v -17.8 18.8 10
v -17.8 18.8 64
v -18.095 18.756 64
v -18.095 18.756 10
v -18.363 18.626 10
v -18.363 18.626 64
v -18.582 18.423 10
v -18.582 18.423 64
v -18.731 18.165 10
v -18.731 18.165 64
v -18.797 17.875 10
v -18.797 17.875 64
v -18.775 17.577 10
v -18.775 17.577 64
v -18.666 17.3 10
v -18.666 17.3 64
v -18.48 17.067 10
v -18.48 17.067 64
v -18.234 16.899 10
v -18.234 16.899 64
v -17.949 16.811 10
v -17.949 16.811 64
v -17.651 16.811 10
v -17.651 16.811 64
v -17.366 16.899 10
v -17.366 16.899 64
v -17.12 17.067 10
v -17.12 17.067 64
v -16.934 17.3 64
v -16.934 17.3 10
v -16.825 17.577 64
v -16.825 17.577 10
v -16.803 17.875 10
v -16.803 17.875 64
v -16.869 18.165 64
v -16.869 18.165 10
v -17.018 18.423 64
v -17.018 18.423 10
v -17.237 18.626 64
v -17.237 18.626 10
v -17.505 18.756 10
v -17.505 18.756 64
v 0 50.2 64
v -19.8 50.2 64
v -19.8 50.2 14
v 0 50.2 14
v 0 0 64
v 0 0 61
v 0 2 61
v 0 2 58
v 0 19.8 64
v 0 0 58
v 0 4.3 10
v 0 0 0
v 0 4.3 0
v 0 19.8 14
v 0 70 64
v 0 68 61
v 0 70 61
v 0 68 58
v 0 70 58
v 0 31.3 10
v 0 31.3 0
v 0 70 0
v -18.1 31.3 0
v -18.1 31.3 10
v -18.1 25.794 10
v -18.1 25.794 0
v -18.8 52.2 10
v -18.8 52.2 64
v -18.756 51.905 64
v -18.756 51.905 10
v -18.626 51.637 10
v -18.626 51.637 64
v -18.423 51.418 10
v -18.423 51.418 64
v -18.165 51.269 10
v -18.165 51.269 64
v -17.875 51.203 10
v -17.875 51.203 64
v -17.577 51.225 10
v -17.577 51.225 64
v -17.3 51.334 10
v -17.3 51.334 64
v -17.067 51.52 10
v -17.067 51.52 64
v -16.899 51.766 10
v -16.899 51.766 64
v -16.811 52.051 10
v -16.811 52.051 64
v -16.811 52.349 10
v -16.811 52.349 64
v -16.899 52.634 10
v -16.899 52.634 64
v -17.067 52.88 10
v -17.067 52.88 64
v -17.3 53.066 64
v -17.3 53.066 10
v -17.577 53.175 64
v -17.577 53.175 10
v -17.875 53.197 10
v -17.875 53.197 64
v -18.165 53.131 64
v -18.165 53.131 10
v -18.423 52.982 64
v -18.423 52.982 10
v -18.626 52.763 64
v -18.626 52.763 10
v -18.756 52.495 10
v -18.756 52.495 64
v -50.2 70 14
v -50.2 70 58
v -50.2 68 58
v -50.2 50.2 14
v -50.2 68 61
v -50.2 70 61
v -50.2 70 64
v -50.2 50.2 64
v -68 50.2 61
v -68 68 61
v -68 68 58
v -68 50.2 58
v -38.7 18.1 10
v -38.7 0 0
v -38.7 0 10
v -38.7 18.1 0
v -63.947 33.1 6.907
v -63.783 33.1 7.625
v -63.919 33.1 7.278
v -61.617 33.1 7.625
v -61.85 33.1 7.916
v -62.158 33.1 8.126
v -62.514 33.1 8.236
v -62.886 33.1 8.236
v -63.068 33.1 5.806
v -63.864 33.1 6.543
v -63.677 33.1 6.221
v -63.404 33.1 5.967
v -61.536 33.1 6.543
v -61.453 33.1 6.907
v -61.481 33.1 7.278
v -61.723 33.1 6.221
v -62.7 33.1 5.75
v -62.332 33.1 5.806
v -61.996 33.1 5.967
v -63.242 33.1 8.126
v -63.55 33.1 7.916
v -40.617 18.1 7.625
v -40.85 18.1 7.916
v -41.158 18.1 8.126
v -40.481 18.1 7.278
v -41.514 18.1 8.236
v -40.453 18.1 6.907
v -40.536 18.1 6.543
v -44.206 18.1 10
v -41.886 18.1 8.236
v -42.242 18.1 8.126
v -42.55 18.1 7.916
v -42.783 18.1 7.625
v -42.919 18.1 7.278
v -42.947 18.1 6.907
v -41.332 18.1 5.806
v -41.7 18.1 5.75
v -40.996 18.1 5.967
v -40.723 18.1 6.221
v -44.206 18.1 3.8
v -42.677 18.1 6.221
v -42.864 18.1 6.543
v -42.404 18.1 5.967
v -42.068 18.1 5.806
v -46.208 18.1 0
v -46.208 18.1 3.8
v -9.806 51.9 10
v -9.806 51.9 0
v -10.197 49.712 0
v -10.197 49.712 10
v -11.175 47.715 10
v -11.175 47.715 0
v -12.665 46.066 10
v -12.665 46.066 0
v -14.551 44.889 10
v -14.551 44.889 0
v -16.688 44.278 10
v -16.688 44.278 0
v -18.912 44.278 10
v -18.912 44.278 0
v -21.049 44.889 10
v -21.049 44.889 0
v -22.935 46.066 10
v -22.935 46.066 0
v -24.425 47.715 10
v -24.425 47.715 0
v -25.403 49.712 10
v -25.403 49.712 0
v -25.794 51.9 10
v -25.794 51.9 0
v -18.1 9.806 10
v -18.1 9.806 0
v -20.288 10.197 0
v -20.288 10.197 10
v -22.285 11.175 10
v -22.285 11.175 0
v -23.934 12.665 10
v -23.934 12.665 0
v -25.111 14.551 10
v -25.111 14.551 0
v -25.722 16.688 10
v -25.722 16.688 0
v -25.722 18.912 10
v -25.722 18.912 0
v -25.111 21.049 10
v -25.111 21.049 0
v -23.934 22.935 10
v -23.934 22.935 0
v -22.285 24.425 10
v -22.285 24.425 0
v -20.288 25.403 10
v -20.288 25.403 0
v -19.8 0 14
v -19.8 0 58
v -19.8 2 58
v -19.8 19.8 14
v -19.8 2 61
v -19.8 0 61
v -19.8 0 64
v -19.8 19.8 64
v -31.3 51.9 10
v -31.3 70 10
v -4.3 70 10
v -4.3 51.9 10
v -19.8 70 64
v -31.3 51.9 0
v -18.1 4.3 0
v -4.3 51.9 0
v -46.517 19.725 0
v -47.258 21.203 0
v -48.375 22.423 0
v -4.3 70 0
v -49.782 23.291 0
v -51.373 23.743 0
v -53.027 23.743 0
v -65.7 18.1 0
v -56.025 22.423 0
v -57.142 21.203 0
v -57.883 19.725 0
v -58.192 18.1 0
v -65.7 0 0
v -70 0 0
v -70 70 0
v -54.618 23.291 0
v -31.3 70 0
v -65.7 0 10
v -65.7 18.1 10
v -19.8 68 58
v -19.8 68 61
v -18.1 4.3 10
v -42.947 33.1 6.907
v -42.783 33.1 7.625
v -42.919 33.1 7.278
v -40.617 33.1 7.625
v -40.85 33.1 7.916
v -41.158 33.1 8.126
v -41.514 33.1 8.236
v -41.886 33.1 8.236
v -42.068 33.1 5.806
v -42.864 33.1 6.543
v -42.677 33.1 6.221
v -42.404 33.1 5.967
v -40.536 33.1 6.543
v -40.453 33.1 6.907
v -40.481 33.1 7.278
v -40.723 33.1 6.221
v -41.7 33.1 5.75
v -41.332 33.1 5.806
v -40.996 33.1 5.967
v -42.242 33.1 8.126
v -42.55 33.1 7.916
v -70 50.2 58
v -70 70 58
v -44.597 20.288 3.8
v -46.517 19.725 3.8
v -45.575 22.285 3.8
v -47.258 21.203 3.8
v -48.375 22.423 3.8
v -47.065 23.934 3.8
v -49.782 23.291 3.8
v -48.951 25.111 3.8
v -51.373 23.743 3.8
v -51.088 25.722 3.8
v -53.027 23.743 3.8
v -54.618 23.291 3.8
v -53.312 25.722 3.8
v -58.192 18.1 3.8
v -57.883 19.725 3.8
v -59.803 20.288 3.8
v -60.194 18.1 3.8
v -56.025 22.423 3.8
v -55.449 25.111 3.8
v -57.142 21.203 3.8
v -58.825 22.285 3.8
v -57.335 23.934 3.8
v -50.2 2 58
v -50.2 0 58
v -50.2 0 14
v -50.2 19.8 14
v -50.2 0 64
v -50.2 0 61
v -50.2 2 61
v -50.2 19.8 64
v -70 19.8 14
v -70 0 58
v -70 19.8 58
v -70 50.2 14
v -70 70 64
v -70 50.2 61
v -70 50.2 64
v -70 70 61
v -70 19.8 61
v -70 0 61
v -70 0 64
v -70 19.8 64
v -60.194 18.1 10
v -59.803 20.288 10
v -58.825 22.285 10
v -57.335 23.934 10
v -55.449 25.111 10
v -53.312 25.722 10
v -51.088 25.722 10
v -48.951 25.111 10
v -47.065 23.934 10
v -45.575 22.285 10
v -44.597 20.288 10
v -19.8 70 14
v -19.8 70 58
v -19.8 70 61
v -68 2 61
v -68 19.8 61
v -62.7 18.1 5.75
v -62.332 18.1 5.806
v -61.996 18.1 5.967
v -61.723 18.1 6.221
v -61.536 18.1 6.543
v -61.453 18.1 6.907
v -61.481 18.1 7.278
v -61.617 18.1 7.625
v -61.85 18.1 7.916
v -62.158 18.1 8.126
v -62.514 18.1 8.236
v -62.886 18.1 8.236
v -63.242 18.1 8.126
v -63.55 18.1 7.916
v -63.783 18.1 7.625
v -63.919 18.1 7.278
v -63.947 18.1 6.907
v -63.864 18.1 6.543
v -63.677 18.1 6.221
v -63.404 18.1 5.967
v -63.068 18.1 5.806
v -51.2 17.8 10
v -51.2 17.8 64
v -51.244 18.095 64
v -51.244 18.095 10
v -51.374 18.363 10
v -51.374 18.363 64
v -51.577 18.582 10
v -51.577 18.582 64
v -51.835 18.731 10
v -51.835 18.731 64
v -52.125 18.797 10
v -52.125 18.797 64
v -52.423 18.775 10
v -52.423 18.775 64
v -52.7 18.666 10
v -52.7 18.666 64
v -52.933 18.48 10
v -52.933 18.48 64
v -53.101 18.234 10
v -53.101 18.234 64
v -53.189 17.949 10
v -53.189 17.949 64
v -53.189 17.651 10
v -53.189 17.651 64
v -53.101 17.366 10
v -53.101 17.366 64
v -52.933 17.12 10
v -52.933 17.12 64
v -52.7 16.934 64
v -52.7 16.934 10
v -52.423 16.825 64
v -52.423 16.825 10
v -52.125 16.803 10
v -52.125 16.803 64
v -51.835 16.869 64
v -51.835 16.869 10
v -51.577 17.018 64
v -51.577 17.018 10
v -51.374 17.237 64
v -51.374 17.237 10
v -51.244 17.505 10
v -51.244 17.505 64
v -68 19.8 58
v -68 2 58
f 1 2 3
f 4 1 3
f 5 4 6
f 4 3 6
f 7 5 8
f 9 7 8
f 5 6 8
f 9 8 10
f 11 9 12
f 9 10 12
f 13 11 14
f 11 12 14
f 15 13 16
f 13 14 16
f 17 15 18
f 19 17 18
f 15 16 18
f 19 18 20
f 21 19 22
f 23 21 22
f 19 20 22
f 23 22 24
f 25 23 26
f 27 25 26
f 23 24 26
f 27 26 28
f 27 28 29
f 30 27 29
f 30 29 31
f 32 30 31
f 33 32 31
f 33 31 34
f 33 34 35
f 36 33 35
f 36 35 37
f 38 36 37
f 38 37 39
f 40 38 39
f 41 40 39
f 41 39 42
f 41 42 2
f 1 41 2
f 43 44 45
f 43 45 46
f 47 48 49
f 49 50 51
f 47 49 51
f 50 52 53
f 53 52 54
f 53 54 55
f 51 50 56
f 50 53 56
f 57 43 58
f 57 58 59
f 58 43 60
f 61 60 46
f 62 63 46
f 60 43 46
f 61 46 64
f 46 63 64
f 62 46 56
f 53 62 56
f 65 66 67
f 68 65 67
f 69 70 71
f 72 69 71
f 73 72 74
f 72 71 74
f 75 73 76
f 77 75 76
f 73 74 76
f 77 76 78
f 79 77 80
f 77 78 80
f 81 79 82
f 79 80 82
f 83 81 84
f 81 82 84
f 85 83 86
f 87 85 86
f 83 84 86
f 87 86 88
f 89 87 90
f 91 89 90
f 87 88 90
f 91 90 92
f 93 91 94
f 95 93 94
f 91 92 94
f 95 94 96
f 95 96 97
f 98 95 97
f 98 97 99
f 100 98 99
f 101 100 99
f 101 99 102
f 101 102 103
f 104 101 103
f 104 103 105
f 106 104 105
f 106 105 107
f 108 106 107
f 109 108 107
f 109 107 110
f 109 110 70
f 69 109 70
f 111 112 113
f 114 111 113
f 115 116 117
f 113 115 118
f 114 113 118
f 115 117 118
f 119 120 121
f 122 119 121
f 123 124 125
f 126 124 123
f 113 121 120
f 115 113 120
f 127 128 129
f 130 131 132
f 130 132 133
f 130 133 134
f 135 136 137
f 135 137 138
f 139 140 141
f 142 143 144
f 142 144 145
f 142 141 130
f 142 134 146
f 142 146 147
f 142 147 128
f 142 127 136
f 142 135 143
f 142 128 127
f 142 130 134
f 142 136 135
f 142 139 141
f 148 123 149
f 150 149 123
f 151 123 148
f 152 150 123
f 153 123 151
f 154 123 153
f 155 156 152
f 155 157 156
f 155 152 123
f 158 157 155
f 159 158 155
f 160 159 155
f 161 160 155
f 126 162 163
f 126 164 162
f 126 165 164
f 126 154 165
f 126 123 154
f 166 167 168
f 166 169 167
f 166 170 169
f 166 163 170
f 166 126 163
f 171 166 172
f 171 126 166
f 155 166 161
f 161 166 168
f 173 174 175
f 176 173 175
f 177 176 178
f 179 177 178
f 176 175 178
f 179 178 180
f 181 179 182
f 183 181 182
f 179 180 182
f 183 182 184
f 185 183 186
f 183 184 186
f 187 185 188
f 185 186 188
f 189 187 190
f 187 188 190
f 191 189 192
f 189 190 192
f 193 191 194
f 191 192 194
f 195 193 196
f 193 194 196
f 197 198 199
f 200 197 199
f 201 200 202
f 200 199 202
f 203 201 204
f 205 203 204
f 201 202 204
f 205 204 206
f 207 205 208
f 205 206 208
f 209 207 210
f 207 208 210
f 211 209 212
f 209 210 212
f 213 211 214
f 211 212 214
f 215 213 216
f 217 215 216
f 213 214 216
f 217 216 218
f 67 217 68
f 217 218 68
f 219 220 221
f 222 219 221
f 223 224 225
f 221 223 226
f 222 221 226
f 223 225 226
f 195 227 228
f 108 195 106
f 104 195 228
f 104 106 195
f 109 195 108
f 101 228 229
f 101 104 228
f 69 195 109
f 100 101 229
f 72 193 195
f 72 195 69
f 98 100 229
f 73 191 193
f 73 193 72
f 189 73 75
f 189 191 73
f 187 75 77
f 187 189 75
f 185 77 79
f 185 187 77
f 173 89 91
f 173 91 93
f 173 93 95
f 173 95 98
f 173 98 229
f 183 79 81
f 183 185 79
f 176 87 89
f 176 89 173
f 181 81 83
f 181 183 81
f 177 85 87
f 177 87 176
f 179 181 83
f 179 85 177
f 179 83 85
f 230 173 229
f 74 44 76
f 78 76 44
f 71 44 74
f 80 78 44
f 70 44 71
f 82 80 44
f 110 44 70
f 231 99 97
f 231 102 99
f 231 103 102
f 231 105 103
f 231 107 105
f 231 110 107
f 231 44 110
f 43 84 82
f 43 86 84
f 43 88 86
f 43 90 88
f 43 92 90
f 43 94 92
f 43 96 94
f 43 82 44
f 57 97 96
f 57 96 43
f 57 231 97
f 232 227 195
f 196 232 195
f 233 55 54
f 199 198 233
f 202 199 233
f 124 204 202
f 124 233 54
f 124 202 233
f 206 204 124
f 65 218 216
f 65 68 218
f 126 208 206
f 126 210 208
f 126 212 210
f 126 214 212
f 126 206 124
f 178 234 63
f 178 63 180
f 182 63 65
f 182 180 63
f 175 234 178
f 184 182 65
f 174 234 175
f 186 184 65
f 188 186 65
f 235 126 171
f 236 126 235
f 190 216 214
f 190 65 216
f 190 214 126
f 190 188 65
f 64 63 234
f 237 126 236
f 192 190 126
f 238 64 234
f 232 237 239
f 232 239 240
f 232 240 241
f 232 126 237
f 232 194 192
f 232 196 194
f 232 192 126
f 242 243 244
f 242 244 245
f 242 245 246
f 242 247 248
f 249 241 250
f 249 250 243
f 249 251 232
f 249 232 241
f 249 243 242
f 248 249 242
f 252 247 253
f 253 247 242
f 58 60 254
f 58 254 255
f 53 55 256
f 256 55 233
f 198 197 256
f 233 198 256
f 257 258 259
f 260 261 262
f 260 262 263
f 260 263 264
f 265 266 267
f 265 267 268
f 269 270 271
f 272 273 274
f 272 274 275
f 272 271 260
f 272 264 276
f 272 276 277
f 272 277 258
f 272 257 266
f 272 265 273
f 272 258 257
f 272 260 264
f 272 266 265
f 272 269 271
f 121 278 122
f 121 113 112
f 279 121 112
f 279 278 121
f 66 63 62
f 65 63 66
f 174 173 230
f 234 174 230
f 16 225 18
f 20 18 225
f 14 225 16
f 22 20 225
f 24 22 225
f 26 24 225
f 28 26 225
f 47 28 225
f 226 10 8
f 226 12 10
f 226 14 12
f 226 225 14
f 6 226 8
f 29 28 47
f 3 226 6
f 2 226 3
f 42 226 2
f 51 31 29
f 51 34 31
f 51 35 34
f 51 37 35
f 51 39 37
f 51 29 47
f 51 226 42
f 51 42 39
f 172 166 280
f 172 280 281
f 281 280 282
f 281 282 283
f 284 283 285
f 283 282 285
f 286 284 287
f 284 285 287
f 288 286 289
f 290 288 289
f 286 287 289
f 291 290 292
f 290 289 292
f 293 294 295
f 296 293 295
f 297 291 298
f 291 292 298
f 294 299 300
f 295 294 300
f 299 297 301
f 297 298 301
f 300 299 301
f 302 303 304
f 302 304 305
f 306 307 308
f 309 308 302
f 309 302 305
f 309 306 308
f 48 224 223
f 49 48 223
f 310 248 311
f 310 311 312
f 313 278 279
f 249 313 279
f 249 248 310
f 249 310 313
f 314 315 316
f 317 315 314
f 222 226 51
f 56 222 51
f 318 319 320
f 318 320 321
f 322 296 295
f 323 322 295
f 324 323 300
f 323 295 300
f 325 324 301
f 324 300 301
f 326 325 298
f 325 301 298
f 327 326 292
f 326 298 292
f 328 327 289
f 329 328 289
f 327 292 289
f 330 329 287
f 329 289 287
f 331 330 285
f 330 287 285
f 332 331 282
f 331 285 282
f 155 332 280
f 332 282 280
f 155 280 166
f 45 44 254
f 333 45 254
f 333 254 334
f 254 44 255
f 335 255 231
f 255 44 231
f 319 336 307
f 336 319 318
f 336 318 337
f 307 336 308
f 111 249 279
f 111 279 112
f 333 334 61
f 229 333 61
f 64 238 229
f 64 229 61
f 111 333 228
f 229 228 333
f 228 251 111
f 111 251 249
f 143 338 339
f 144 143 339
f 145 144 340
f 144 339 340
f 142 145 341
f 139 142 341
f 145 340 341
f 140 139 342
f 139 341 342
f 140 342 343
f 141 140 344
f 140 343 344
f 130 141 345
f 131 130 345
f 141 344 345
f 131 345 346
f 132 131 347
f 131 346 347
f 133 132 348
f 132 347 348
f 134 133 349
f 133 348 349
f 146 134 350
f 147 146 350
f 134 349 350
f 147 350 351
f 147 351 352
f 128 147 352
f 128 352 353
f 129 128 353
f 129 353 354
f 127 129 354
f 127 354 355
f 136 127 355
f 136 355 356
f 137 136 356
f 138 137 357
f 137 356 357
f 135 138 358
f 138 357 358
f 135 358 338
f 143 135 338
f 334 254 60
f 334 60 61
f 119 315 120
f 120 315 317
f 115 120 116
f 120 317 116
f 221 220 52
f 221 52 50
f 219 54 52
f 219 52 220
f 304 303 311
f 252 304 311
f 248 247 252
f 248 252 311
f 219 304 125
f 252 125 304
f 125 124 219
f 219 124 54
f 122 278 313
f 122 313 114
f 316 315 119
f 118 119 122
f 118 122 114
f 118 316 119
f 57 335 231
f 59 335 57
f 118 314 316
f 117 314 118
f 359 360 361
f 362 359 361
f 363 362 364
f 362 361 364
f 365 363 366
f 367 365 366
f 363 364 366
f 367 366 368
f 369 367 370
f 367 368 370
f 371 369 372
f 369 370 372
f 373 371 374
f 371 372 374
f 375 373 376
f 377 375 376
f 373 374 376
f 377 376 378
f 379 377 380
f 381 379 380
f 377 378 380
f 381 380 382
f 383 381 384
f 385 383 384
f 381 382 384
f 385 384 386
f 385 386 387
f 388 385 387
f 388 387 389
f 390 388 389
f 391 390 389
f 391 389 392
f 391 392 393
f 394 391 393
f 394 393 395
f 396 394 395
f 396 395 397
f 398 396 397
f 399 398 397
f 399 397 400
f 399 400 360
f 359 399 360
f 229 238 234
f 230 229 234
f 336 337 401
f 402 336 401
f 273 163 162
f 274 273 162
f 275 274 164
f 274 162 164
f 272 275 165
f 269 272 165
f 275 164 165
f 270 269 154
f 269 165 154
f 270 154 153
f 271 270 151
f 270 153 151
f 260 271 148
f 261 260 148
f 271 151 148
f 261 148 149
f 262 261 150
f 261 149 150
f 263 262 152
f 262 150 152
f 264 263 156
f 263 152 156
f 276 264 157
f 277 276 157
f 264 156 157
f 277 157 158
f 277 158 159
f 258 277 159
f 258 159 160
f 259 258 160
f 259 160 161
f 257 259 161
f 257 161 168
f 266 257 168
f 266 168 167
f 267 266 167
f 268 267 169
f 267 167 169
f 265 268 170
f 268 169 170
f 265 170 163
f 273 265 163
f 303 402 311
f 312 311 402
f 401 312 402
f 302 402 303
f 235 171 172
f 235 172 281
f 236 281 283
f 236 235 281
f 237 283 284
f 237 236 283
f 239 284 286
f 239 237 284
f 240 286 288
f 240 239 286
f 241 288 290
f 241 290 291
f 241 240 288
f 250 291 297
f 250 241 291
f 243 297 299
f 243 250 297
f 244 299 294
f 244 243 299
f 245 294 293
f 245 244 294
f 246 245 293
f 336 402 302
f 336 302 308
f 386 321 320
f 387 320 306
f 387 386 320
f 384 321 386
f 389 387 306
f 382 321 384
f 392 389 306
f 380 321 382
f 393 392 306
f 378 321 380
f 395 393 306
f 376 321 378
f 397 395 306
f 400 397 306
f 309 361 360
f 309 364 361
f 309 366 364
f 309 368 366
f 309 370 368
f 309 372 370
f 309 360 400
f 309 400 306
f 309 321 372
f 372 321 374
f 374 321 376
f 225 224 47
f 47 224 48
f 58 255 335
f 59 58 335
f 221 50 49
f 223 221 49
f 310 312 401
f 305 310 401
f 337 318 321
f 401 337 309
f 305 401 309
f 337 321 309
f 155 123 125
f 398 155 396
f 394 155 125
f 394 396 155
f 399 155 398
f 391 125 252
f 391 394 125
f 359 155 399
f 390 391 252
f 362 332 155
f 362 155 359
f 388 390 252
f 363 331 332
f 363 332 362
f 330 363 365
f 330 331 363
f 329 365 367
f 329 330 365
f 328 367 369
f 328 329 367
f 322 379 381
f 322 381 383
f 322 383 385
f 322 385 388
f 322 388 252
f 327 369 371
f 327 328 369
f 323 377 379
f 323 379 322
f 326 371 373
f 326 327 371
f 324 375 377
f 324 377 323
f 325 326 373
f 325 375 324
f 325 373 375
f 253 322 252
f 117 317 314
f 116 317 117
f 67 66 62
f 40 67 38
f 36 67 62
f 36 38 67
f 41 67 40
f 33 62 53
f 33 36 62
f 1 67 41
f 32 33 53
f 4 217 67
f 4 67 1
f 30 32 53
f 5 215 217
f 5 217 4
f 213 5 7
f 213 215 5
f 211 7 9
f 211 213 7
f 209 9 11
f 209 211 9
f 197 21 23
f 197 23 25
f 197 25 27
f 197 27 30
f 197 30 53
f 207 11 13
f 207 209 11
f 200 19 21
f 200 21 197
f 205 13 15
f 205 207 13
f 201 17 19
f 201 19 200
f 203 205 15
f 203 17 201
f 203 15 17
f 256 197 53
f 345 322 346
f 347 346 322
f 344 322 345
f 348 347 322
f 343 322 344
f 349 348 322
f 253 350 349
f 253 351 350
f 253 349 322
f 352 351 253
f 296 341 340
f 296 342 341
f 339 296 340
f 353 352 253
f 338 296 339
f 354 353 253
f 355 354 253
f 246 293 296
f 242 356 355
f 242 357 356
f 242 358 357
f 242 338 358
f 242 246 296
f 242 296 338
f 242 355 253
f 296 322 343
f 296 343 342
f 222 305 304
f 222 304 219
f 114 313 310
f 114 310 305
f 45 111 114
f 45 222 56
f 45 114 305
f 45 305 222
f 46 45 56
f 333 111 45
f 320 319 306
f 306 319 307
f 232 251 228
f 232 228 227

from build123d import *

# Parameters (mm, degrees)
ESQUISSE1_W                  = 70
ESQUISSE1_H                  = 70
BOSS_EXTRU_1_DEPTH           = 64
ESQUISSE2_W                  = 30.4
ESQUISSE2_H                  = 19.8
ESQUISSE2_H_2                = 30.4
ESQUISSE2_W_2                = 19.8
ENL_V_MAT_EXTRU_1_DEPTH      = 50
ESQUISSE5_W                  = 3
ESQUISSE5_H                  = 2
ENL_V_MAT_EXTRU_3_DEPTH      = 71
ESQUISSE6_W                  = 2
ESQUISSE6_H                  = 3
ENL_V_MAT_EXTRU_4_DEPTH      = 71
ESQUISSE7_R                  = 1
ENL_V_MAT_EXTRU_5_DEPTH      = 65
ENL_V_MAT_EXTRU_7_DEPTH      = 10
BOSS_EXTRU_2_DEPTH           = 3.8
ESQUISSE10_W                 = 27
ESQUISSE10_H                 = 18.1
ENL_V_MAT_EXTRU_8_DEPTH      = 10
ESQUISSE11_R                 = 1.25
ENL_V_MAT_EXTRU_9_DEPTH      = 15
R_P_TITION_CIRCULAIRE1_COUNT = 3
R_P_TITION_CIRCULAIRE1_ANGLE = 180


with BuildPart() as part:
    # Esquisse1 → Boss.-Extru.1 (new body)
    with BuildSketch(Plane.XY):
        with Locations((-35, 35)):
            Rectangle(ESQUISSE1_W, ESQUISSE1_H)
    extrude(amount=BOSS_EXTRU_1_DEPTH)

    # Esquisse2 → Enlèv. mat.-Extru.1 (cut)
    with BuildSketch(Plane.XY.offset(64)):
        with Locations((-35, 60.1)):
            Rectangle(ESQUISSE2_W, ESQUISSE2_H)
        with Locations((-35, 35)):
            Rectangle(ESQUISSE2_W, ESQUISSE2_H_2)
        with Locations((-9.9, 35)):
            Rectangle(ESQUISSE2_W_2, ESQUISSE2_H_2)
        with Locations((-60.1, 35)):
            Rectangle(ESQUISSE2_W_2, ESQUISSE2_H_2)
        with Locations((-35, 9.9)):
            Rectangle(ESQUISSE2_W, ESQUISSE2_H)
    extrude(amount=-ENL_V_MAT_EXTRU_1_DEPTH, mode=Mode.SUBTRACT)

    # Esquisse5 → Enlèv. mat.-Extru.3 (cut, through all)
    with BuildSketch(Plane.ZY.offset(70)):
        with Locations((59.5, 69)):
            Rectangle(ESQUISSE5_W, ESQUISSE5_H)
        with Locations((59.5, 1)):
            Rectangle(ESQUISSE5_W, ESQUISSE5_H)
    extrude(amount=-ENL_V_MAT_EXTRU_3_DEPTH, mode=Mode.SUBTRACT)

    # Esquisse6 → Enlèv. mat.-Extru.4 (cut, through all)
    with BuildSketch(Plane(origin=(0, 70, 0), x_dir=(1, 0, 0), z_dir=(0, 1, 0))):
        with Locations((-69, -59.5)):
            Rectangle(ESQUISSE6_W, ESQUISSE6_H)
    extrude(amount=-ENL_V_MAT_EXTRU_4_DEPTH, mode=Mode.SUBTRACT)

    # Esquisse7 → Enlèv. mat.-Extru.5 (cut, through all)
    with BuildSketch(Plane.XY.offset(64)):
        with Locations((-52.2, 17.8)):
            Circle(ESQUISSE7_R)
    enl_v_mat_extru_5 = extrude(amount=-ENL_V_MAT_EXTRU_5_DEPTH, mode=Mode.SUBTRACT)

    # Esquisse8 → Enlèv. mat.-Extru.7 (cut)
    with BuildSketch(Plane(origin=(0, 0, 0), x_dir=(-1, 0, 0), z_dir=(0, 0, -1))):
        with BuildLine():
            Line((60.2, 0), (60.2, 17.8))
            ThreePointArc((60.2, 17.8), (52.2, 9.8), (44.2, 17.8))
            Line((44.2, 17.8), (44.2, 0))
            Line((44.2, 0), (60.2, 0))
        make_face()
        with BuildLine():
            ThreePointArc((44.2, 17.8), (52.2, 9.8), (60.2, 17.8))
            Line((60.2, 17.8), (53.2, 17.8))
            ThreePointArc((53.2, 17.8), (52.2, 16.8), (51.2, 17.8))
            Line((51.2, 17.8), (44.2, 17.8))
        make_face()
        with BuildLine():
            Line((53.2, 17.8), (60.2, 17.8))
            ThreePointArc((60.2, 17.8), (52.2, 25.8), (44.2, 17.8))
            Line((44.2, 17.8), (51.2, 17.8))
            ThreePointArc((51.2, 17.8), (52.2, 18.8), (53.2, 17.8))
        make_face()
    enl_v_mat_extru_7 = extrude(amount=-ENL_V_MAT_EXTRU_7_DEPTH, mode=Mode.SUBTRACT)

    # Esquisse9 → Boss.-Extru.2 (add)
    with BuildSketch(Plane(origin=(0, 0, 0), x_dir=(-1, 0, 0), z_dir=(0, 0, -1))):
        with BuildLine():
            Line((46.2, 0), (46.2, 17.8))
            ThreePointArc((46.2, 17.8), (52.2, 23.8), (58.2, 17.8))
            Line((58.2, 17.8), (58.2, 0))
            Line((58.2, 0), (60.2, 0))
            Line((60.2, 0), (60.2, 17.8))
            Line((60.2, 17.8), (60.175717696, 28.742363645))
            Line((60.175717696, 28.742363645), (44.2, 28.742363645))
            Line((44.2, 28.742363645), (44.2, 0))
            Line((44.2, 0), (46.2, 0))
        make_face()
    extrude(amount=-BOSS_EXTRU_2_DEPTH)

    # Esquisse10 → Enlèv. mat.-Extru.8 (cut)
    with BuildSketch(Plane(origin=(0, 0, 0), x_dir=(-1, 0, 0), z_dir=(0, 0, -1))):
        with Locations((52.2, 9.05)):
            Rectangle(ESQUISSE10_W, ESQUISSE10_H)
    enl_v_mat_extru_8 = extrude(amount=-ENL_V_MAT_EXTRU_8_DEPTH, mode=Mode.SUBTRACT)

    # Esquisse11 → Enlèv. mat.-Extru.9 (cut)
    with BuildSketch(Plane.XZ.offset(-18.1)):
        with Locations(Location((-41.7, 7, 0), (0, 0, 270))):  # turned: the seam where the file's is
            Circle(ESQUISSE11_R)
        with Locations(Location((-62.7, 7, 0), (0, 0, 270))):  # turned: the seam where the file's is
            Circle(ESQUISSE11_R)
    extrude(amount=-ENL_V_MAT_EXTRU_9_DEPTH, mode=Mode.SUBTRACT)

    # Répétition circulaire1: Enlèv. mat.-Extru.5, Enlèv. mat.-Extru.7, Enlèv. mat.-Extru.8 ×3 about axis
    r_p_tition_circulaire1_axis = Axis((-35, 35, 0), (0, 0, 1))
    add([enl_v_mat_extru_5.rotate(r_p_tition_circulaire1_axis, i * R_P_TITION_CIRCULAIRE1_ANGLE / (R_P_TITION_CIRCULAIRE1_COUNT - 1)) for i in range(1, R_P_TITION_CIRCULAIRE1_COUNT)], mode=Mode.SUBTRACT)
    add([enl_v_mat_extru_7.rotate(r_p_tition_circulaire1_axis, i * R_P_TITION_CIRCULAIRE1_ANGLE / (R_P_TITION_CIRCULAIRE1_COUNT - 1)) for i in range(1, R_P_TITION_CIRCULAIRE1_COUNT)], mode=Mode.SUBTRACT)
    add([enl_v_mat_extru_8.rotate(r_p_tition_circulaire1_axis, i * R_P_TITION_CIRCULAIRE1_ANGLE / (R_P_TITION_CIRCULAIRE1_COUNT - 1)) for i in range(1, R_P_TITION_CIRCULAIRE1_COUNT)], mode=Mode.SUBTRACT)


solid = part.part
